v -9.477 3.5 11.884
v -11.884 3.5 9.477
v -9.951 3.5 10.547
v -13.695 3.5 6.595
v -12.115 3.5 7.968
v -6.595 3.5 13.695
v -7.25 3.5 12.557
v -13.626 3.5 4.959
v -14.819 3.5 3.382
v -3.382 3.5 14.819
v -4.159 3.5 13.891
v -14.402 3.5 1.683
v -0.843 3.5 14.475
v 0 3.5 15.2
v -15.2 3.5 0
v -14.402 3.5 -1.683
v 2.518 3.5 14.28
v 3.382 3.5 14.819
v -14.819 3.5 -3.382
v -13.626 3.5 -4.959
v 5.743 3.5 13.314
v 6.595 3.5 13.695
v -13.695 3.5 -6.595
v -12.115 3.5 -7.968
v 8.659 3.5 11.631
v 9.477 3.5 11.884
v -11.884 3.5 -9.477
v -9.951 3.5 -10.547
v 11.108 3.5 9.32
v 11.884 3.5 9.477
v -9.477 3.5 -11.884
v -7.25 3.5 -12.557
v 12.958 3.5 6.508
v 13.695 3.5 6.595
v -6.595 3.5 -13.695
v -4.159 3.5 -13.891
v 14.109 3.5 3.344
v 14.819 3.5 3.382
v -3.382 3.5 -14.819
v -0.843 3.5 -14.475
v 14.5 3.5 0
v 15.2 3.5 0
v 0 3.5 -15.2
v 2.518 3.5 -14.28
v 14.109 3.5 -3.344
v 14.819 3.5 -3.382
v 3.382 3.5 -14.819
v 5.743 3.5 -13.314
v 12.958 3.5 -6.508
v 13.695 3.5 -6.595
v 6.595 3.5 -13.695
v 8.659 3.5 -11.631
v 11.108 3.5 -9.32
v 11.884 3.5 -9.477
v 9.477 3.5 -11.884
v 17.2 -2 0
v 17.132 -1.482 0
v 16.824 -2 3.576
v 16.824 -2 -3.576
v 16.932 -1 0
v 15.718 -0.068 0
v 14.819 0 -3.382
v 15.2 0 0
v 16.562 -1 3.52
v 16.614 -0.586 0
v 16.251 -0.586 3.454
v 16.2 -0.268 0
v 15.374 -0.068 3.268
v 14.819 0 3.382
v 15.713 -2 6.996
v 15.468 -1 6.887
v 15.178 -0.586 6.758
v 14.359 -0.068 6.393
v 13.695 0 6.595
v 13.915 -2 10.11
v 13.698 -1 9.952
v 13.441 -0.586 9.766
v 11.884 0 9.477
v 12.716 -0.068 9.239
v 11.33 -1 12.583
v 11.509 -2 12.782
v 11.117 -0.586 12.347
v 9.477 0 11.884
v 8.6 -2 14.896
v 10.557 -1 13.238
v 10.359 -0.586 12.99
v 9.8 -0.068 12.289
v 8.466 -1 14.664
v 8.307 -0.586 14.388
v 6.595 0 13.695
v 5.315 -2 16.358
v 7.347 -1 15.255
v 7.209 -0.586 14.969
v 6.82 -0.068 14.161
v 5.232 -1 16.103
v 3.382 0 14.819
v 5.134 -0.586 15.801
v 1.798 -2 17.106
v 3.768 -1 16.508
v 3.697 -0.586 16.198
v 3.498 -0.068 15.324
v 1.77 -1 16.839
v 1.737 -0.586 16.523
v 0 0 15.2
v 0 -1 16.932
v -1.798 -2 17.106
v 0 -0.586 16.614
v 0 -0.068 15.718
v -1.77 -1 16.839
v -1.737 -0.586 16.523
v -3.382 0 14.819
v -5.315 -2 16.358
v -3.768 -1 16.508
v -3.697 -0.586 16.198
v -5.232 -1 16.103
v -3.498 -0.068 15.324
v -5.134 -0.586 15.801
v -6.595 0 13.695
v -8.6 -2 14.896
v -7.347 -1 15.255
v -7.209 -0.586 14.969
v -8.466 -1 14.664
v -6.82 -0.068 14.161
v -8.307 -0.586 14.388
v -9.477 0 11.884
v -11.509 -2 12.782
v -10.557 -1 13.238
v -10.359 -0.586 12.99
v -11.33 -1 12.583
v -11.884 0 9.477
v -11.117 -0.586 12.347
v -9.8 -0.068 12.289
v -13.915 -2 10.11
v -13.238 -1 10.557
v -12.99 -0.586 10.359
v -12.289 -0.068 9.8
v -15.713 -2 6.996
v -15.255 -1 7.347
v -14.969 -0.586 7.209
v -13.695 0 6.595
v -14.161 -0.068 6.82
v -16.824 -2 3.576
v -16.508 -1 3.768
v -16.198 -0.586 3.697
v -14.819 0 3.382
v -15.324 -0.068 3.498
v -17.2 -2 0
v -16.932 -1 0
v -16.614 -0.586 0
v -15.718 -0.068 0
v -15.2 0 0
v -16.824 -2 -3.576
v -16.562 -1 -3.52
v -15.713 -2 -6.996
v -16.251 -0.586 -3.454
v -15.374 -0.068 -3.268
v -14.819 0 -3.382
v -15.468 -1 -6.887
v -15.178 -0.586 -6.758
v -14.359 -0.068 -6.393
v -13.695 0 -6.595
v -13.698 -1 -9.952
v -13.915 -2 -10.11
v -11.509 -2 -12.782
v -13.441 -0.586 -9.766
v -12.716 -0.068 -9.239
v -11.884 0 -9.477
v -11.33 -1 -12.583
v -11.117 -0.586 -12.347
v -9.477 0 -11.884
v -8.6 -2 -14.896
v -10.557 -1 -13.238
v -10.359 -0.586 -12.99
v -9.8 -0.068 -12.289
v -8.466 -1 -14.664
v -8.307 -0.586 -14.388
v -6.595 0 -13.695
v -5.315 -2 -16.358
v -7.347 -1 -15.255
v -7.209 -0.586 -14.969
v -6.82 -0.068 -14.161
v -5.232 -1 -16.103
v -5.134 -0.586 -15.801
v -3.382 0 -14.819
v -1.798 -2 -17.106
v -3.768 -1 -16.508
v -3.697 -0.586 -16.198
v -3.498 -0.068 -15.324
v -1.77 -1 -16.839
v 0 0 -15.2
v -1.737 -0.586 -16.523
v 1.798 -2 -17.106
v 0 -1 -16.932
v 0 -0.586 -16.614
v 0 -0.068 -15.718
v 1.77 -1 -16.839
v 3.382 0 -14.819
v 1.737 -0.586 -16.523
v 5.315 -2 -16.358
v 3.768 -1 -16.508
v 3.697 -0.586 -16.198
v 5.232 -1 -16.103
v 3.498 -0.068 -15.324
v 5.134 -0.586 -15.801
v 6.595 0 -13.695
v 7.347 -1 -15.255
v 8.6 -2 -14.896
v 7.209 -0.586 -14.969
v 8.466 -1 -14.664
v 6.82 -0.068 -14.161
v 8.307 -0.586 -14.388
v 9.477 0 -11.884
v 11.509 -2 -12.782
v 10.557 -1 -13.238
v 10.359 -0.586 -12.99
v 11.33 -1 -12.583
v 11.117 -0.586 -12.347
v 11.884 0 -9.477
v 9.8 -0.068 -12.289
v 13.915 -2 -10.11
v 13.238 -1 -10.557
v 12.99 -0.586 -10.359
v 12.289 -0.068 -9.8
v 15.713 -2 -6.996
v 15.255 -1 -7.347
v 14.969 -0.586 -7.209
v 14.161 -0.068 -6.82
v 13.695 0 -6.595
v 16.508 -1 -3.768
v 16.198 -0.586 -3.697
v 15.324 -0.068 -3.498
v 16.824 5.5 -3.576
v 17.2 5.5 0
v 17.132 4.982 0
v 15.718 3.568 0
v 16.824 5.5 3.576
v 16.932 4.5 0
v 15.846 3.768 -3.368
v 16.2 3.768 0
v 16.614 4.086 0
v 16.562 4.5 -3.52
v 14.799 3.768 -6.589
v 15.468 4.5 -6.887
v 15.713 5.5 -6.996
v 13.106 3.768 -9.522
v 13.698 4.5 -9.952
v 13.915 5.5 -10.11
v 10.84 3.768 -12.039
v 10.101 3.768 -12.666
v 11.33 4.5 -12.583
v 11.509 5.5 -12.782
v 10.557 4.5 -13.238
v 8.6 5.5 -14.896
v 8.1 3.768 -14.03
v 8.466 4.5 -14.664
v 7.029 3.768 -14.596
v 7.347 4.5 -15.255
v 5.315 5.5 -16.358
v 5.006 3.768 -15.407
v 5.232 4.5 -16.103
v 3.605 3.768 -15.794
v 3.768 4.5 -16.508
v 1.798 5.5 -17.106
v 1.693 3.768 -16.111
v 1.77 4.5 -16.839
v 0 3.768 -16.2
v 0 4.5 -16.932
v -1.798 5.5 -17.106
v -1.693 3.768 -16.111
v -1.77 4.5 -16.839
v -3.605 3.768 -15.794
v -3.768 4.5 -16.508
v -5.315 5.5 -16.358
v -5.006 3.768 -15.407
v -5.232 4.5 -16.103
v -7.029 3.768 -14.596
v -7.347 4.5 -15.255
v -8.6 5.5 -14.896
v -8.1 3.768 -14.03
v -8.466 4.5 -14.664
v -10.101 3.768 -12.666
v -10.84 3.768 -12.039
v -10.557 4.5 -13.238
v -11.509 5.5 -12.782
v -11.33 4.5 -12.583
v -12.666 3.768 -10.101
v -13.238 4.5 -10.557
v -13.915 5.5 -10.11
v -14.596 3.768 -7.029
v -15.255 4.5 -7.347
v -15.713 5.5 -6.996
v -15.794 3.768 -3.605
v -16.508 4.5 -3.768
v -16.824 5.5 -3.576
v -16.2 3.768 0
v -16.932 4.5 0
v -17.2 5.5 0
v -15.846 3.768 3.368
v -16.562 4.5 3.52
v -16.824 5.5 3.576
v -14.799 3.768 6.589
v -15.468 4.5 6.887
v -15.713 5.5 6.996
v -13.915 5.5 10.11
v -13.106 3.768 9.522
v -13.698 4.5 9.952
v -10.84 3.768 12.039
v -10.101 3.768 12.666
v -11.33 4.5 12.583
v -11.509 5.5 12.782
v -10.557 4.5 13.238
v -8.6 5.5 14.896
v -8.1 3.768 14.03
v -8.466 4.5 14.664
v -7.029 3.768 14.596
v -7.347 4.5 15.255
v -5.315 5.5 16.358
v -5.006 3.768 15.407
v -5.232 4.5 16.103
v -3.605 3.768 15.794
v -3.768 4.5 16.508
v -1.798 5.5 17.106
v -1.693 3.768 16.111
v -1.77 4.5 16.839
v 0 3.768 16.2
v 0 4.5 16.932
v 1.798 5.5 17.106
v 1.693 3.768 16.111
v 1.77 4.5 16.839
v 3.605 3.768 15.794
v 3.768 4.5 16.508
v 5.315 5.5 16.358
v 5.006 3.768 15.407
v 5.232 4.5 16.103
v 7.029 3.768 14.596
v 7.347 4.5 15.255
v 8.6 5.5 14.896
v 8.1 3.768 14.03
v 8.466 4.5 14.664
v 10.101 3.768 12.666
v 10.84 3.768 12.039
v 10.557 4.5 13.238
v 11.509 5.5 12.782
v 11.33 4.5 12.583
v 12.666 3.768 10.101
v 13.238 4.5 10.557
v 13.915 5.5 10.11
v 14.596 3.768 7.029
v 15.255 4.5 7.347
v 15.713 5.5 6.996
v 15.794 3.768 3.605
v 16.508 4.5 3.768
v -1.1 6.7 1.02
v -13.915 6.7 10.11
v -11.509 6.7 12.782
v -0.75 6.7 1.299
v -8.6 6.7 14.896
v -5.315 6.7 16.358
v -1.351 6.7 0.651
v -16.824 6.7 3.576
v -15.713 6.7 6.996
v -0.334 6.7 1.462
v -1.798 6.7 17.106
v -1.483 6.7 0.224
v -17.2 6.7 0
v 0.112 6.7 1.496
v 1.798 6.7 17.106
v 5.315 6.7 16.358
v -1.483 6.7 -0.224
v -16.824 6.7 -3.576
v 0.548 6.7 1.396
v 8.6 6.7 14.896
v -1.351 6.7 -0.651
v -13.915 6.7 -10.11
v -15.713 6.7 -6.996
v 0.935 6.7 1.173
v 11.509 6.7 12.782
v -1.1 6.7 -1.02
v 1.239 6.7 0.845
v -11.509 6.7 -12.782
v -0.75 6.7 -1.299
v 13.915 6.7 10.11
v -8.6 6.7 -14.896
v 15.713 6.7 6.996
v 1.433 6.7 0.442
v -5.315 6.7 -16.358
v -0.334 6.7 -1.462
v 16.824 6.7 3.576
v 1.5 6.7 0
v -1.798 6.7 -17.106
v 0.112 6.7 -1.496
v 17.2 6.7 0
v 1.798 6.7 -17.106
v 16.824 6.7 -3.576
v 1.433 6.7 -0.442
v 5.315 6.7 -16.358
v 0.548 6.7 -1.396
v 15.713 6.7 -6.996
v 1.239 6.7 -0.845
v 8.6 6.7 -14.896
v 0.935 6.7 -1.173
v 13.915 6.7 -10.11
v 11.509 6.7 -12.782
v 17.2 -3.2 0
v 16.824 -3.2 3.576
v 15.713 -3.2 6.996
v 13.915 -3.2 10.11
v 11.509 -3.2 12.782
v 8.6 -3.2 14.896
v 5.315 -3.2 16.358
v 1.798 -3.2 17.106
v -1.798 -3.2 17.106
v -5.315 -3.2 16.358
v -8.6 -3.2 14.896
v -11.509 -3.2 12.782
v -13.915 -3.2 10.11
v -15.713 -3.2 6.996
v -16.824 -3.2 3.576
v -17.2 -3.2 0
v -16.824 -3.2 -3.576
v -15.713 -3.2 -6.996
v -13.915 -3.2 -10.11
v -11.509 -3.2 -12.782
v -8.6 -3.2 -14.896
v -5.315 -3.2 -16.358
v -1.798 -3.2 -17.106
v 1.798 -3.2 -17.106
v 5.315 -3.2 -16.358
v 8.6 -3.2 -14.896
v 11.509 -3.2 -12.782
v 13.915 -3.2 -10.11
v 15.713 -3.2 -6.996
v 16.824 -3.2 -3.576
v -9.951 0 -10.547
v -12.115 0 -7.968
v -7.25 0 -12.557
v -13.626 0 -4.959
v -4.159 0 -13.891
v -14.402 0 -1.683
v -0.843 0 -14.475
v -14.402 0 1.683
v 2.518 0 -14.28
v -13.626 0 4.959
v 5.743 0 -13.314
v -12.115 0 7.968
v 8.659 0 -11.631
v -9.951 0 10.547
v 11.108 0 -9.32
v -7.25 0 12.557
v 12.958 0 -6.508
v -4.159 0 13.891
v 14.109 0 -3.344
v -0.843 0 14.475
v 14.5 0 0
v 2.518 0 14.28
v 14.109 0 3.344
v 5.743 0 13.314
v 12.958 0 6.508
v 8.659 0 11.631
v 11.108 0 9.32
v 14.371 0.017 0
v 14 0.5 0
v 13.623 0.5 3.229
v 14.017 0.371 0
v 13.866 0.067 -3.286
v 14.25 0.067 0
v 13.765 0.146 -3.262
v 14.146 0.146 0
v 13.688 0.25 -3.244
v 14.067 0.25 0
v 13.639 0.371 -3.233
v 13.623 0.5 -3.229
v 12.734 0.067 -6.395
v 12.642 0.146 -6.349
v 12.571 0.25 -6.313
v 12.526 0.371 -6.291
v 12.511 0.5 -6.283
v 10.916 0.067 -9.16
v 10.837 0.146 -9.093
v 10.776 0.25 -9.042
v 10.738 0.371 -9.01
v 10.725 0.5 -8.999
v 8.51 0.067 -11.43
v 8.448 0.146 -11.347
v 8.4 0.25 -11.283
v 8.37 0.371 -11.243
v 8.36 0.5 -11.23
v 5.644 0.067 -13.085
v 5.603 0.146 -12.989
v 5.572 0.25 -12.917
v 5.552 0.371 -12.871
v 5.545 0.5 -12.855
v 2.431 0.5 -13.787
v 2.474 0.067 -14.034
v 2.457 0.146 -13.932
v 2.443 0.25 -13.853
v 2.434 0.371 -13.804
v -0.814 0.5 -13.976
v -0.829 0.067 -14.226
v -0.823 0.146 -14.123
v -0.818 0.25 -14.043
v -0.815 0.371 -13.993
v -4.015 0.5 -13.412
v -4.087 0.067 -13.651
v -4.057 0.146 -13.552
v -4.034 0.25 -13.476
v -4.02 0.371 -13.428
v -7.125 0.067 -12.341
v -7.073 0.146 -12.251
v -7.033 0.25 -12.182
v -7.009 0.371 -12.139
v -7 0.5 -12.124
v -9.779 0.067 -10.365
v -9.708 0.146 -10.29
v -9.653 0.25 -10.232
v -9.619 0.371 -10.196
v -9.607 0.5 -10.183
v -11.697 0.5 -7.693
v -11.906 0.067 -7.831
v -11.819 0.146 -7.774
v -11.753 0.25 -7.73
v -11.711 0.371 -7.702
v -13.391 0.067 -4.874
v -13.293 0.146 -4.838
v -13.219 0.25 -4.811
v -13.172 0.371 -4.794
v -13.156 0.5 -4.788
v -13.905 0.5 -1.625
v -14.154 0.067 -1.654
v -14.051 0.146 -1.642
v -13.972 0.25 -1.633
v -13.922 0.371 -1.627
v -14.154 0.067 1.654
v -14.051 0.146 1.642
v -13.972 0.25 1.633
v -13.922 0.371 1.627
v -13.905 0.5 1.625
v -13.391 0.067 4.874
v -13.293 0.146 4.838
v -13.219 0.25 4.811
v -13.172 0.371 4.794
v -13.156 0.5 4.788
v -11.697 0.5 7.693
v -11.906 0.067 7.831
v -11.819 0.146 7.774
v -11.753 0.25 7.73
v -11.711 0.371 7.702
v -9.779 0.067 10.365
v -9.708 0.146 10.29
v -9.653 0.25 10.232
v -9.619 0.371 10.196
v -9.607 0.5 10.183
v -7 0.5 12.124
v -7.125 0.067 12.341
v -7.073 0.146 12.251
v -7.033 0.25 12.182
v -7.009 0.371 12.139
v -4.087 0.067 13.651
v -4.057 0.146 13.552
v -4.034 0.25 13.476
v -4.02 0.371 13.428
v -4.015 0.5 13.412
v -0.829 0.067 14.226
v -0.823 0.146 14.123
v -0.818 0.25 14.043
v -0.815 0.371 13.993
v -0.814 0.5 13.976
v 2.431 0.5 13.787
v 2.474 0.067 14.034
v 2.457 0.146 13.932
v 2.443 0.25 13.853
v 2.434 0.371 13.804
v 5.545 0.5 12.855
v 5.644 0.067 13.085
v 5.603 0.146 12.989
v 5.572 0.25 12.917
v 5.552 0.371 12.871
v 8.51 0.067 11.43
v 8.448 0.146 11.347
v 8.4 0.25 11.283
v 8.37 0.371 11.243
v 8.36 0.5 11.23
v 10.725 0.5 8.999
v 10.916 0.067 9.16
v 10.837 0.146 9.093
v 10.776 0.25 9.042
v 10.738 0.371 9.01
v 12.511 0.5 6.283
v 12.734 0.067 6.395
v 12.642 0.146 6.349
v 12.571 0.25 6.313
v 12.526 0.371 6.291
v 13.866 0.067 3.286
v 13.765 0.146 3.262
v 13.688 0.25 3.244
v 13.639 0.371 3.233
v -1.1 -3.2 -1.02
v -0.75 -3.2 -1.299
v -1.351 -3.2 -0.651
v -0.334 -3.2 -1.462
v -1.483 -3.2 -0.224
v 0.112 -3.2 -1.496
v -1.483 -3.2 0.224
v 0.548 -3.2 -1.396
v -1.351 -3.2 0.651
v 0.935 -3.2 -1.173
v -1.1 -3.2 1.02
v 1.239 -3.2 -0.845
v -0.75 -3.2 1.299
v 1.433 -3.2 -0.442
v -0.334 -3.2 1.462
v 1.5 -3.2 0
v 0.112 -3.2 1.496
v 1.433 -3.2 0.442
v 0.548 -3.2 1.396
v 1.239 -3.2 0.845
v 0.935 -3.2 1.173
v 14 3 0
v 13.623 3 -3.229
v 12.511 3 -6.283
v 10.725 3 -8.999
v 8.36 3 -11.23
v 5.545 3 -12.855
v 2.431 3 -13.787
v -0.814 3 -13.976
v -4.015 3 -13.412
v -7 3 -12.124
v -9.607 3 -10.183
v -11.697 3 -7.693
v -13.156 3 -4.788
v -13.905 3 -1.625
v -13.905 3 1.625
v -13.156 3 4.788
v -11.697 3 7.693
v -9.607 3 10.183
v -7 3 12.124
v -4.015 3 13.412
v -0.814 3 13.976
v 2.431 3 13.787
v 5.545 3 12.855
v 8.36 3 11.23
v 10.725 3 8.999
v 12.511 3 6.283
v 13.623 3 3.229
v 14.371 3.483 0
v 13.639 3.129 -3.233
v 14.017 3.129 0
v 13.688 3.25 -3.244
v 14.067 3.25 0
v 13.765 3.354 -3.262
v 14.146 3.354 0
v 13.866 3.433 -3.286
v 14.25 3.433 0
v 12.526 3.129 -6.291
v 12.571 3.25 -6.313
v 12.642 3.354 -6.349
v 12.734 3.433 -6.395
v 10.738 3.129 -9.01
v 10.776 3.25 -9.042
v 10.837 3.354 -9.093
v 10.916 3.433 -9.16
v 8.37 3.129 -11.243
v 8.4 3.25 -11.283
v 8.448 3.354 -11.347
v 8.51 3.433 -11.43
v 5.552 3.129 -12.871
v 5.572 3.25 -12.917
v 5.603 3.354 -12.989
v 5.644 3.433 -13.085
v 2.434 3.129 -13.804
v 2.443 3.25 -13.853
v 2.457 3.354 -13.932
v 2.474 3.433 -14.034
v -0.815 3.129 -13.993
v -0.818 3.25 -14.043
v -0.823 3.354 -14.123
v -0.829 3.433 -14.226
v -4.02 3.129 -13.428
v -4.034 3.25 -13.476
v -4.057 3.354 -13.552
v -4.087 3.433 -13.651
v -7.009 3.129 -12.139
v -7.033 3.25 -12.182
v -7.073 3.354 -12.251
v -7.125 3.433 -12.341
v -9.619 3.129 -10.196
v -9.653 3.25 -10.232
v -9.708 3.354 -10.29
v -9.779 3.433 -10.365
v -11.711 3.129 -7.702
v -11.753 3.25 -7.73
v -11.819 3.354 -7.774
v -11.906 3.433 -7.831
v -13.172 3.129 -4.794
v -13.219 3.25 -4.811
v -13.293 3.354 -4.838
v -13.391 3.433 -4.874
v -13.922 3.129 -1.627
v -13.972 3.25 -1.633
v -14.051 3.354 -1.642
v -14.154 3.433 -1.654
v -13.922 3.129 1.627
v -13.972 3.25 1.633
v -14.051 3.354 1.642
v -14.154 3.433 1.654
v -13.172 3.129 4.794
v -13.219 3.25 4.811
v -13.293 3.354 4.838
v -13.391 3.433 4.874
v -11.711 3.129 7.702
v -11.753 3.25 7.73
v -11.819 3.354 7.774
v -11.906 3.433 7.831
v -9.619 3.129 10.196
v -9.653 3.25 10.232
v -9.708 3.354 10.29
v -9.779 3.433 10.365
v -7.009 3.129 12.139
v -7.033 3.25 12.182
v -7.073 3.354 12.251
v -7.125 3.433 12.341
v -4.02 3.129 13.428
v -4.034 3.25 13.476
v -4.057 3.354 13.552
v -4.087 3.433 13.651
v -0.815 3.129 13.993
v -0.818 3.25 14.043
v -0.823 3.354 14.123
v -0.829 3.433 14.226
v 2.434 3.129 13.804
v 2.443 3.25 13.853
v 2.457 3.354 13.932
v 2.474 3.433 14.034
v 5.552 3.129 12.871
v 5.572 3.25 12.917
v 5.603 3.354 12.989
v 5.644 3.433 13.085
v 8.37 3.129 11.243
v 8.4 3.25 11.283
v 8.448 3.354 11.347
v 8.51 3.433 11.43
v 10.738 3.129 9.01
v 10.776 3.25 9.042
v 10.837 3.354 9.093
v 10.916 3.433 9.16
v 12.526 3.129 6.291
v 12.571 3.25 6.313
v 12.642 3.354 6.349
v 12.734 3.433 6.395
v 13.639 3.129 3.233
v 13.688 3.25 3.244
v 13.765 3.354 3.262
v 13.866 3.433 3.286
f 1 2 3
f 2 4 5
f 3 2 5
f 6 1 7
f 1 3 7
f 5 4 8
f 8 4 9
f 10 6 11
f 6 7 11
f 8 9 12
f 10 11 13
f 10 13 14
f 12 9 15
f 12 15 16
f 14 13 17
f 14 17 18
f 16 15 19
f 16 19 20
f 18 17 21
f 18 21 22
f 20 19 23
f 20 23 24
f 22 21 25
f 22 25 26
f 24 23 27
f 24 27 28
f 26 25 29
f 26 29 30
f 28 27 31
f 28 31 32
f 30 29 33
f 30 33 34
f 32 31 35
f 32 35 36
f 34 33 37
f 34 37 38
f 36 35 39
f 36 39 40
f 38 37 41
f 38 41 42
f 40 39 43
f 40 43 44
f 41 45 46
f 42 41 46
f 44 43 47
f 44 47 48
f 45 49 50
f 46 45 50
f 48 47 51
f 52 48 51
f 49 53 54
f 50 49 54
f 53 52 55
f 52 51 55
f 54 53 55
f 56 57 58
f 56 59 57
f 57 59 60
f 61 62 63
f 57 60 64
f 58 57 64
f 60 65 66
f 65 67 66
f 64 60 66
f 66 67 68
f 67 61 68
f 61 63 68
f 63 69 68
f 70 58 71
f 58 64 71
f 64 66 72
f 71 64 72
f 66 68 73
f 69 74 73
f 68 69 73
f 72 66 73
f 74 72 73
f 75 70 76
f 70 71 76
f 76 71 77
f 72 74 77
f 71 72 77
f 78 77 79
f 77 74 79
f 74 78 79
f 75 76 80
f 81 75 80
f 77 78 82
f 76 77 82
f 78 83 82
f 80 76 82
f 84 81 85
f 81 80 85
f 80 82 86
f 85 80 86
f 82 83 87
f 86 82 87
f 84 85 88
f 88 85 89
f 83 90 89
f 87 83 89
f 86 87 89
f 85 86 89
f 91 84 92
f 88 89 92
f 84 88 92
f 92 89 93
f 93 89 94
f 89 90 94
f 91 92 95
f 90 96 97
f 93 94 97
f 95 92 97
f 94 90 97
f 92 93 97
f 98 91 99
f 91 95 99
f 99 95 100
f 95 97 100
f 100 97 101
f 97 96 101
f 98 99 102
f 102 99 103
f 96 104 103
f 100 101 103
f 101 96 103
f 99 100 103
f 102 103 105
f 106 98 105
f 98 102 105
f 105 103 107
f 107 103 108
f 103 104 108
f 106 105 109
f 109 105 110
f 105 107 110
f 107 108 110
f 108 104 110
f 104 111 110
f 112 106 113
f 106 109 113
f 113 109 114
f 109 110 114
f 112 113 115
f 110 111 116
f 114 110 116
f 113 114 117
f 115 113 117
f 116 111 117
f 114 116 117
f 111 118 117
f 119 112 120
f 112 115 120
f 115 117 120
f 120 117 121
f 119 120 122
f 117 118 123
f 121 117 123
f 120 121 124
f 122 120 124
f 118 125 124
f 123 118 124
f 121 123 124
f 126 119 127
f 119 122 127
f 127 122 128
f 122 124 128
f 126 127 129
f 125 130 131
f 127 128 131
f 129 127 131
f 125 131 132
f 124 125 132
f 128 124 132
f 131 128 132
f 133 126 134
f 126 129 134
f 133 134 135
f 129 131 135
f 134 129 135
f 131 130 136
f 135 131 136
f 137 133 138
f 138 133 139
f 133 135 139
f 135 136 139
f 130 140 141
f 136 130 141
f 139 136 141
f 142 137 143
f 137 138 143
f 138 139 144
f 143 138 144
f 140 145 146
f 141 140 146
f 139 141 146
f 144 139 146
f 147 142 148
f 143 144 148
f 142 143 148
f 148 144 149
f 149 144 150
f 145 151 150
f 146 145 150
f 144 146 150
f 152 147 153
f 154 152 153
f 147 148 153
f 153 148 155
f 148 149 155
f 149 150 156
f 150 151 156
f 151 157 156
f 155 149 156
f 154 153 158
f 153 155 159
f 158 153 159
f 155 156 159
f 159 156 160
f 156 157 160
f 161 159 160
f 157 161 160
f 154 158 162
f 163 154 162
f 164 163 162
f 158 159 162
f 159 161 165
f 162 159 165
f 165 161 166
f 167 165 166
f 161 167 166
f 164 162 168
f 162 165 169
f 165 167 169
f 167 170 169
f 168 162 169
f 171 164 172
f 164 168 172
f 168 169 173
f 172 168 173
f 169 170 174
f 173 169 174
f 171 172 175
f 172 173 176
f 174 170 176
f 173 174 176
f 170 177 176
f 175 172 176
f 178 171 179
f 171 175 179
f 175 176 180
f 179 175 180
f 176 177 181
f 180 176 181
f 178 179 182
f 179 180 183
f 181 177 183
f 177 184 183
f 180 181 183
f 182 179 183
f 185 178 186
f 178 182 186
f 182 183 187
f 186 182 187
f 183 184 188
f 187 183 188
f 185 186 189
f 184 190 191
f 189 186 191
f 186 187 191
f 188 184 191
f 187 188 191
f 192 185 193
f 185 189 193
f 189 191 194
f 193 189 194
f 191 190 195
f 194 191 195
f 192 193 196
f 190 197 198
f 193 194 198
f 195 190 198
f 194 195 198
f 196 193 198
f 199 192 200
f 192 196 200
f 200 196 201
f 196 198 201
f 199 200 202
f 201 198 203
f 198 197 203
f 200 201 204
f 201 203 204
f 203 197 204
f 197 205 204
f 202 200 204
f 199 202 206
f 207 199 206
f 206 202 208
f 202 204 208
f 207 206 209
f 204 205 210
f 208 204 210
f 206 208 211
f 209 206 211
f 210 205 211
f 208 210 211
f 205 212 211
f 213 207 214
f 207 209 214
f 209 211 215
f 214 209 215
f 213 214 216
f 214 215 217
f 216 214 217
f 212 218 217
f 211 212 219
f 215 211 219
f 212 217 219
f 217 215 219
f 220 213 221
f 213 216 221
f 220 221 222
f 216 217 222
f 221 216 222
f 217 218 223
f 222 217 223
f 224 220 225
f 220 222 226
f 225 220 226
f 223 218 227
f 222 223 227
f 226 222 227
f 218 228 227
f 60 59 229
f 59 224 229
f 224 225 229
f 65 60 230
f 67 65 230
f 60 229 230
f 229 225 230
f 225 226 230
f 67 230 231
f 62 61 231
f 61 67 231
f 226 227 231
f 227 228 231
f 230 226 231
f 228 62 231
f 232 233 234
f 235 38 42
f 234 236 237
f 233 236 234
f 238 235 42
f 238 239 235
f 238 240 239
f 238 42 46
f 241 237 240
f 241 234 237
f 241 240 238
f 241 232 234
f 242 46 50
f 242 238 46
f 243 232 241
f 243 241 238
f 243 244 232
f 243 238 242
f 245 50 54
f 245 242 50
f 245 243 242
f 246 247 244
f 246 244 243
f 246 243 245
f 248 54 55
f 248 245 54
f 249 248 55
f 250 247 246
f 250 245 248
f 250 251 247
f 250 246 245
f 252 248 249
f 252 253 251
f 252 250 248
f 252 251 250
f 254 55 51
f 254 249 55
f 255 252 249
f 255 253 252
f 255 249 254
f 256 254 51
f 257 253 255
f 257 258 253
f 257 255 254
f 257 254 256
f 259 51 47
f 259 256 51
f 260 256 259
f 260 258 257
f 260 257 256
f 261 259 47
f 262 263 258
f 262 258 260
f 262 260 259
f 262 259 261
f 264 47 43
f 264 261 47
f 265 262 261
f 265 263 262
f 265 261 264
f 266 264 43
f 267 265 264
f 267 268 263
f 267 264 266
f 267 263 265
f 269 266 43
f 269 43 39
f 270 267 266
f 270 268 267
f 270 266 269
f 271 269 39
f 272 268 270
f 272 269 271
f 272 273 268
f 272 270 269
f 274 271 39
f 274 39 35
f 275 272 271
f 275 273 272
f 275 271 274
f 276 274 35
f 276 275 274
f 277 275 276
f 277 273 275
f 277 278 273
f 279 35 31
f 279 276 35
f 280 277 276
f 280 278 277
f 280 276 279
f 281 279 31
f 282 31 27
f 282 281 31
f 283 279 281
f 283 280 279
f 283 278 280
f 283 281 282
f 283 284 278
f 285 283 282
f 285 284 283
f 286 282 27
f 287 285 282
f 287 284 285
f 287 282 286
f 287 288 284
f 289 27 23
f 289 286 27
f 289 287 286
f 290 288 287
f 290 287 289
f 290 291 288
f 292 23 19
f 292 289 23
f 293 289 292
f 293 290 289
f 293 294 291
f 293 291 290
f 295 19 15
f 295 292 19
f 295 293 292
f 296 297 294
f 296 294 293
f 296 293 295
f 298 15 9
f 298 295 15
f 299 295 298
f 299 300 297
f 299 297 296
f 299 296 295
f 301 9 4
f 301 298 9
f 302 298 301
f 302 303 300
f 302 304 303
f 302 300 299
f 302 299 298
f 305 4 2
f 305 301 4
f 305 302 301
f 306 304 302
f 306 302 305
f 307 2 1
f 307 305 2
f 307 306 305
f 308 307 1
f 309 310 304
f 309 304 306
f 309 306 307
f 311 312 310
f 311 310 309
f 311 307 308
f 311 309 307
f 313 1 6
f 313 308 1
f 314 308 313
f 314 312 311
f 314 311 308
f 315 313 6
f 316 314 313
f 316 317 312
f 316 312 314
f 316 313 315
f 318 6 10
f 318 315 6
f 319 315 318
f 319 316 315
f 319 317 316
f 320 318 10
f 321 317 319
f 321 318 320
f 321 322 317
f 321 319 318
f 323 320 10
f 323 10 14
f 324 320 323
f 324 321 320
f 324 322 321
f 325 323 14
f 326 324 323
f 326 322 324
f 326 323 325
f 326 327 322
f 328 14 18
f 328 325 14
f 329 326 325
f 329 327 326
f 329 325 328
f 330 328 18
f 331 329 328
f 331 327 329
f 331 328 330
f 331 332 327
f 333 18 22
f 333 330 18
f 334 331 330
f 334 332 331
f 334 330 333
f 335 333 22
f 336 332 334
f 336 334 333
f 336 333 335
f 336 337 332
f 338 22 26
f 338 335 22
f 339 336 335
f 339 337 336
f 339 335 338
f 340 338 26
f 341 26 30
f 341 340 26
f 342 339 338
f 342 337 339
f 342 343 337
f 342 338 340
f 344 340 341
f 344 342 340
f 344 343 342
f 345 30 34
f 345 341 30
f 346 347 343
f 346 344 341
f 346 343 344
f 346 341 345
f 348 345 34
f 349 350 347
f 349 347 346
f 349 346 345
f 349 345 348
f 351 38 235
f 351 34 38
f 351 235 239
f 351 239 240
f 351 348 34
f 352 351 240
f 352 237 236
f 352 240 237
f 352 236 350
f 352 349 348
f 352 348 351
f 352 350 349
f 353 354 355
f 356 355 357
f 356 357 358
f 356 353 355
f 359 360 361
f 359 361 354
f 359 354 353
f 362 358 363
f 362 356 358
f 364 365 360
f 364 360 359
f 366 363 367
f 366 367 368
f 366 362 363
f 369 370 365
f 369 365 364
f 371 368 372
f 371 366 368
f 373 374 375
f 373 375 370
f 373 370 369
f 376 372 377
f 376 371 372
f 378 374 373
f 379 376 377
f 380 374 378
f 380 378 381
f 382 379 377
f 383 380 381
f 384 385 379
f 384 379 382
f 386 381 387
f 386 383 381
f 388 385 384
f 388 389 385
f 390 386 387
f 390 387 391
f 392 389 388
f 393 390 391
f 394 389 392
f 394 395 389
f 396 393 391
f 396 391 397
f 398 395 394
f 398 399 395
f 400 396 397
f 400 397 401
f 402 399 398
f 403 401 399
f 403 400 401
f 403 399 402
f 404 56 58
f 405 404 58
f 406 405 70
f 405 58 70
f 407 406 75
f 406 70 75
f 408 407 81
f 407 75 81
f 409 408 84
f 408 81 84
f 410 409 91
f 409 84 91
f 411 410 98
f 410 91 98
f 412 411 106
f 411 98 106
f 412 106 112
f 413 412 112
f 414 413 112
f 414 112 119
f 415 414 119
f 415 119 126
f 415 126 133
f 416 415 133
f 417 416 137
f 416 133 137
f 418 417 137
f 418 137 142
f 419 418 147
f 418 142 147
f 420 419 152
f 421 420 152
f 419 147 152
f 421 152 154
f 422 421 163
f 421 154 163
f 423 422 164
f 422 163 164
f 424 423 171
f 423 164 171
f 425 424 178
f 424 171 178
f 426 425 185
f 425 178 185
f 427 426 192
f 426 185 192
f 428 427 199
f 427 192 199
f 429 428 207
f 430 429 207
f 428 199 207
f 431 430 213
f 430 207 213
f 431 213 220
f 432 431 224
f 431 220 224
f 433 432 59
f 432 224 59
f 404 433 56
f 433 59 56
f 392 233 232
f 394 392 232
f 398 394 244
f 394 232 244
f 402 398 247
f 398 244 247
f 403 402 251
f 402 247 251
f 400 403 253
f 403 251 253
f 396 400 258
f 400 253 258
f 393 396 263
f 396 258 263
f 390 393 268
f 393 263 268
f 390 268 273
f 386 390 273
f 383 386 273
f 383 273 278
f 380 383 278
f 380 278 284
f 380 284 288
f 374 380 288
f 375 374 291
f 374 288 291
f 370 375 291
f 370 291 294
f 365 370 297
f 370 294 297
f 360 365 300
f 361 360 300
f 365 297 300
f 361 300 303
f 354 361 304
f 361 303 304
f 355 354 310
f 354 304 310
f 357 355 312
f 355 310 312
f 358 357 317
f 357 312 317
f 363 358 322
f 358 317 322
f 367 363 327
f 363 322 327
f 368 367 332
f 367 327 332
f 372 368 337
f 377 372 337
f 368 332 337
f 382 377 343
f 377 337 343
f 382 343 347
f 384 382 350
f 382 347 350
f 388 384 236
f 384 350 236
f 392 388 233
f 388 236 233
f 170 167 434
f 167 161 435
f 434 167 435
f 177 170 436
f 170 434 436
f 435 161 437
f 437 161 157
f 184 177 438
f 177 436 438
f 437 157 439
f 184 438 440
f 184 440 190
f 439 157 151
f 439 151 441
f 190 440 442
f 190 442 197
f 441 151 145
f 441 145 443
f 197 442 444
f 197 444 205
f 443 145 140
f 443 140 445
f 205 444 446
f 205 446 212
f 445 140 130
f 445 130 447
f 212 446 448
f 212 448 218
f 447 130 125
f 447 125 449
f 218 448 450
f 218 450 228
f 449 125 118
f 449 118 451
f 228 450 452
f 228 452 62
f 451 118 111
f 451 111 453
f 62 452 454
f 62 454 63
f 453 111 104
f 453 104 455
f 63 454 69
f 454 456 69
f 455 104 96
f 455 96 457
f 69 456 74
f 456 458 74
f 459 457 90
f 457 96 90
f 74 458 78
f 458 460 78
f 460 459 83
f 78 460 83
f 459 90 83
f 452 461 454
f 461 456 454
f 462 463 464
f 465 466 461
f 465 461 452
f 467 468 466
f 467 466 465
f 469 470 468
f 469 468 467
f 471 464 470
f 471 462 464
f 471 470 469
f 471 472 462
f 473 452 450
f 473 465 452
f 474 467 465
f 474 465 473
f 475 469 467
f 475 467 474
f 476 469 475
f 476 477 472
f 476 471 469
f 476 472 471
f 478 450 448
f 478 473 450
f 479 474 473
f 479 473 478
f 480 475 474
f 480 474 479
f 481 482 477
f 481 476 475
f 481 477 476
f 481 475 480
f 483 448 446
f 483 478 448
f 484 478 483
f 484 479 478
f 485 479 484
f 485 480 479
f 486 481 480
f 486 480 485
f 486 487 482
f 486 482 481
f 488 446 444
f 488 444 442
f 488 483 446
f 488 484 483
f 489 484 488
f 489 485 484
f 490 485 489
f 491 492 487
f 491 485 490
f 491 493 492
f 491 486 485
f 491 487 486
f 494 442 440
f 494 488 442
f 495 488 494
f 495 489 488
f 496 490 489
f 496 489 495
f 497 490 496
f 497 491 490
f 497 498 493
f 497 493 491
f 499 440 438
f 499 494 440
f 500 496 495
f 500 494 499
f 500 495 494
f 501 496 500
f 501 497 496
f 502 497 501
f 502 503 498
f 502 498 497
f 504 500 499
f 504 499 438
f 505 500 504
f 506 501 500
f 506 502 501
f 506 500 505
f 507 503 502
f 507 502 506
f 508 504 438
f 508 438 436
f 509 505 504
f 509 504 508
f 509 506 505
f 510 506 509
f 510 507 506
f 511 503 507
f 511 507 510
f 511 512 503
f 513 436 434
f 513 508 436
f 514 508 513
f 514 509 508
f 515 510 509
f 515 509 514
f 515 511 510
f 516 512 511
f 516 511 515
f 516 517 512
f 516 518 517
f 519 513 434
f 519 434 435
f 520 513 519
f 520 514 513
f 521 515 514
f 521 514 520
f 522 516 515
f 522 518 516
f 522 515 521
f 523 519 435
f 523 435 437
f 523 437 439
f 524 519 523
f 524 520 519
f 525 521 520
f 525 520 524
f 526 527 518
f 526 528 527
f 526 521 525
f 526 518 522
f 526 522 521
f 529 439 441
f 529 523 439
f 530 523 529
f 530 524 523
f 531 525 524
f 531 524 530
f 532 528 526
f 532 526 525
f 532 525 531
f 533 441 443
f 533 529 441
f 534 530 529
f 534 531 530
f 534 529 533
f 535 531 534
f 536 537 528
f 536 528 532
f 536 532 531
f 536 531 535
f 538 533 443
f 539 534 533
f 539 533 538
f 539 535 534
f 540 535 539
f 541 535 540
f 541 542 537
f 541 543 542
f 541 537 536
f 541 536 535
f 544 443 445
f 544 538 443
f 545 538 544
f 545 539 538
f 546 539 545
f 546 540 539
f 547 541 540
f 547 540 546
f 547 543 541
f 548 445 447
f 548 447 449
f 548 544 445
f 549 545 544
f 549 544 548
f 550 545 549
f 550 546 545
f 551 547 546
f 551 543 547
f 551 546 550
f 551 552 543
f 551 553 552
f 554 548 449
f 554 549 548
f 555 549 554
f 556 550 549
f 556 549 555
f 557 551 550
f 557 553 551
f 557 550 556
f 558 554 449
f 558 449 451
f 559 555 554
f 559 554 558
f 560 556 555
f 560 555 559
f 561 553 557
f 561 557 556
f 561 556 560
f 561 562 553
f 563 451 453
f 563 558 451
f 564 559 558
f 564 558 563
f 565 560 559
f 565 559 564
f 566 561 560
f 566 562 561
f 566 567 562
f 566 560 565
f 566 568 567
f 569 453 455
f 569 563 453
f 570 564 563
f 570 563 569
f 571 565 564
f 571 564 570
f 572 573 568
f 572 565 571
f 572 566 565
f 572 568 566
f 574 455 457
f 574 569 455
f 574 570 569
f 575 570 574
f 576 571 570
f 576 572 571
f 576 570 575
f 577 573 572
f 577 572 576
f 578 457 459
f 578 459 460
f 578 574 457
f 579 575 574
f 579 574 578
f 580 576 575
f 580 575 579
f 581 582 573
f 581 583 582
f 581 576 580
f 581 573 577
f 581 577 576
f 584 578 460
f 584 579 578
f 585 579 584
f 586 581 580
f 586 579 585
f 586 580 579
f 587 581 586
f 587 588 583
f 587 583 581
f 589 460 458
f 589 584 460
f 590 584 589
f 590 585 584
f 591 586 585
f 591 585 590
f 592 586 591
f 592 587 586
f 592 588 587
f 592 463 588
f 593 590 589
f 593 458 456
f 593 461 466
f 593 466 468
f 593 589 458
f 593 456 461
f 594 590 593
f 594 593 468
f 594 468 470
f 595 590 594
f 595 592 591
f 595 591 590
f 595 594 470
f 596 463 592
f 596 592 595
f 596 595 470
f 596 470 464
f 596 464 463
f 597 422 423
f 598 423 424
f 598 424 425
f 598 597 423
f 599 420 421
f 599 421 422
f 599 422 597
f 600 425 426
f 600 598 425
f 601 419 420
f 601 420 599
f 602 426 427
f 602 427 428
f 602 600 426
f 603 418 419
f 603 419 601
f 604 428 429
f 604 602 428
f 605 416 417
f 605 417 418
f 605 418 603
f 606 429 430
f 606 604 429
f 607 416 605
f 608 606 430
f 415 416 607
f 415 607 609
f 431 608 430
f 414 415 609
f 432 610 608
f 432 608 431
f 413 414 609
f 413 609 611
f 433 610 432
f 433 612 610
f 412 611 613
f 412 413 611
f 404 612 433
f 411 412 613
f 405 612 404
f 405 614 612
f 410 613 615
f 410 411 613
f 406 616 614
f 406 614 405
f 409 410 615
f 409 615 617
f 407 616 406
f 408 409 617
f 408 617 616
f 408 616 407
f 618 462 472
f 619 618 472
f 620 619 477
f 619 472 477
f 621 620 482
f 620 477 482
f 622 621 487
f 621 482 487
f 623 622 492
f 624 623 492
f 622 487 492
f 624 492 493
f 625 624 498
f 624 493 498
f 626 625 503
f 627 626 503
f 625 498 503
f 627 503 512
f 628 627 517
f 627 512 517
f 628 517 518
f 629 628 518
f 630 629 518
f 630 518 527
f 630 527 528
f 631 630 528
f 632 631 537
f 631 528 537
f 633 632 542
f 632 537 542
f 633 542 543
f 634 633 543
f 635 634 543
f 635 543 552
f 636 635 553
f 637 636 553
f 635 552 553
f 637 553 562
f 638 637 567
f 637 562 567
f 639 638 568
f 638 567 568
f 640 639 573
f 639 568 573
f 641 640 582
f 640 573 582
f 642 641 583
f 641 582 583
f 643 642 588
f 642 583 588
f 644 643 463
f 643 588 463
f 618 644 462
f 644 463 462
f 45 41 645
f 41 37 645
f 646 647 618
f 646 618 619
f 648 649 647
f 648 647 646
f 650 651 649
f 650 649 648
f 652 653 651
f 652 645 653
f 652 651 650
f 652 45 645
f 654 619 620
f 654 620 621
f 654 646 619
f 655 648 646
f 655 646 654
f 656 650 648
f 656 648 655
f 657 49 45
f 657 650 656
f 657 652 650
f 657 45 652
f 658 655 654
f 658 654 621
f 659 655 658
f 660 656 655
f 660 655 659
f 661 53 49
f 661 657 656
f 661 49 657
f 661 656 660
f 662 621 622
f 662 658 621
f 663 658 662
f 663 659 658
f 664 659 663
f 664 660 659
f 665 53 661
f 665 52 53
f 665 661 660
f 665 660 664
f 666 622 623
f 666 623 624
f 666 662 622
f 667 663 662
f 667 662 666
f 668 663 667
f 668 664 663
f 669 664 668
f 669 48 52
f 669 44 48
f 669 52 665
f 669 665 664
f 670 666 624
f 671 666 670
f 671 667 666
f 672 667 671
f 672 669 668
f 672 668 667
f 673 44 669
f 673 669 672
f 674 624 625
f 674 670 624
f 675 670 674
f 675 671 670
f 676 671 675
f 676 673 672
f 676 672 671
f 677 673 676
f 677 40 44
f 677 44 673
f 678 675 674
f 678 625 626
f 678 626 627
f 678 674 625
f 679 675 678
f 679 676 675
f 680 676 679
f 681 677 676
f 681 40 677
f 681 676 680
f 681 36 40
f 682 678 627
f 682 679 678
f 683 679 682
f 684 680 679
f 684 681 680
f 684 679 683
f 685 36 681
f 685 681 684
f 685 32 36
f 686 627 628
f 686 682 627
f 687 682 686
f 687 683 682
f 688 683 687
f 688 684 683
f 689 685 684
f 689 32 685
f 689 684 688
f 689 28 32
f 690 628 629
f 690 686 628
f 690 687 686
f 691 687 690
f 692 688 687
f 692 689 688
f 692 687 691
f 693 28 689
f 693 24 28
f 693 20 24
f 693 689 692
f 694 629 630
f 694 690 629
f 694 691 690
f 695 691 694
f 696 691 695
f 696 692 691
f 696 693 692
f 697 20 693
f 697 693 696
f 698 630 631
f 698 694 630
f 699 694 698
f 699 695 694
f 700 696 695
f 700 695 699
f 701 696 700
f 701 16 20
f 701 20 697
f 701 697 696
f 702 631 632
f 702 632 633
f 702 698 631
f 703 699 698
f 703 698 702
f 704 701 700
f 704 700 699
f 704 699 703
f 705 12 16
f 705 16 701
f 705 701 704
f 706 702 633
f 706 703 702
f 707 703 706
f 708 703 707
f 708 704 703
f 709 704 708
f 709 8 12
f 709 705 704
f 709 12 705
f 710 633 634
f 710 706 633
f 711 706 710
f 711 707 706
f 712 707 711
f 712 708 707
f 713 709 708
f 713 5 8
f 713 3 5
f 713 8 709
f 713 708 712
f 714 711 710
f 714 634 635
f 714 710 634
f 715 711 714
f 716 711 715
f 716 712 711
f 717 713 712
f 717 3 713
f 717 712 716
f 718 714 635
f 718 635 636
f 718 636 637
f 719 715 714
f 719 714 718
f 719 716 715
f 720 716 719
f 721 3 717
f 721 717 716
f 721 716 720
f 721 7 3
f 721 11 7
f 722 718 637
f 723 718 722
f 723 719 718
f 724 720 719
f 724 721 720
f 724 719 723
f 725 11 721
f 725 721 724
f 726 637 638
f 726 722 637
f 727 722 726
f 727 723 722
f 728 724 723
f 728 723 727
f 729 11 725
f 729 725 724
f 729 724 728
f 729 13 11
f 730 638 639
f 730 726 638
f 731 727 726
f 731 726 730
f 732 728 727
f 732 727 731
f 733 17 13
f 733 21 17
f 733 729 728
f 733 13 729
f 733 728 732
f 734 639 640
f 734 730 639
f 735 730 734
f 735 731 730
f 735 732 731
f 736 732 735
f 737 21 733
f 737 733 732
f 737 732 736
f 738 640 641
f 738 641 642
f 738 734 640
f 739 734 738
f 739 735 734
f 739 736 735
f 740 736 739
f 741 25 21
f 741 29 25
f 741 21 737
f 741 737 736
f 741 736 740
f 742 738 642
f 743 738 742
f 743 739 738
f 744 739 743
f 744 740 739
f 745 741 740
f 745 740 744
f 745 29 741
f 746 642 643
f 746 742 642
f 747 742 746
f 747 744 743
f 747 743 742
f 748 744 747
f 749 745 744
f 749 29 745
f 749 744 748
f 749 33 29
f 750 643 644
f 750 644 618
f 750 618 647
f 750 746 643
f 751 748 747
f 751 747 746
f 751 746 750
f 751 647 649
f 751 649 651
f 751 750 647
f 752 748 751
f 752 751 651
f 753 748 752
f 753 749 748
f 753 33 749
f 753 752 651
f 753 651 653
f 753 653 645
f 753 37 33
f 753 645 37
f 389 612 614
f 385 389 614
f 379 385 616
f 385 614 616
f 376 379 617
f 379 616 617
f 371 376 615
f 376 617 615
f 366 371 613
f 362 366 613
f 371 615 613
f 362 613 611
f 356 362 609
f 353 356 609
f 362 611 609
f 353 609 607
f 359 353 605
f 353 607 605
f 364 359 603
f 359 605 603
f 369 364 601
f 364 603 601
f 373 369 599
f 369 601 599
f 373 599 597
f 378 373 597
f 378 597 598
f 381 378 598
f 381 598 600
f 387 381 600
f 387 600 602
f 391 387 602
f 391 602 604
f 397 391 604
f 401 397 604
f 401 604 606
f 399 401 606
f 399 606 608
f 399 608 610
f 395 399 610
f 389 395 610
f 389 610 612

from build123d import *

# Parameters (mm, degrees)
CROQUIS1_R              = 14
SALIENTE_EXTRUIR1_DEPTH = 3.5
CROQUIS2_R              = 17.2
SALIENTE_EXTRUIR2_DEPTH = 3.2
CROQUIS3_R              = 17.2
SALIENTE_EXTRUIR3_DEPTH = 3.2
CROQUIS4_R              = 1.5
CORTAR_EXTRUIR1_DEPTH   = 10.9
REDONDEO1_R             = 2
REDONDEO2_R             = 0.5


with BuildPart() as part:
    # Croquis1 → Saliente-Extruir1 (new body)
    with BuildSketch(Plane(origin=(0, 0, 0), x_dir=(1, 0, 0), z_dir=(0, 1, 0))):
        Circle(CROQUIS1_R)
    extrude(amount=SALIENTE_EXTRUIR1_DEPTH)

    # Croquis2 → Saliente-Extruir2 (add)
    with BuildSketch(Plane(origin=(0, 3.5, 0), x_dir=(1, 0, 0), z_dir=(0, 1, 0))):
        Circle(CROQUIS2_R)
    extrude(amount=SALIENTE_EXTRUIR2_DEPTH)

    # Croquis3 → Saliente-Extruir3 (add)
    with BuildSketch(Plane.XZ):
        Circle(CROQUIS3_R)
    extrude(amount=SALIENTE_EXTRUIR3_DEPTH)

    # Croquis4 → Cortar-Extruir1 (cut, through all)
    with BuildSketch(Plane.XZ.offset(3.2)):
        Circle(CROQUIS4_R)
    extrude(amount=-CORTAR_EXTRUIR1_DEPTH, mode=Mode.SUBTRACT)

    # Redondeo1
    redondeo1_edges = [part.edges().sort_by_distance(p)[0] for p in [
        (-17.2, 0, 0),
        (-17.2, 3.5, 0),
    ]]
    fillet(redondeo1_edges, radius=REDONDEO1_R)

    # Redondeo2
    redondeo2_edges = [part.edges().sort_by_distance(p)[0] for p in [
        (-14, 0, 0),
        (-14, 3.5, 0),
    ]]
    fillet(redondeo2_edges, radius=REDONDEO2_R)


solid = part.part
